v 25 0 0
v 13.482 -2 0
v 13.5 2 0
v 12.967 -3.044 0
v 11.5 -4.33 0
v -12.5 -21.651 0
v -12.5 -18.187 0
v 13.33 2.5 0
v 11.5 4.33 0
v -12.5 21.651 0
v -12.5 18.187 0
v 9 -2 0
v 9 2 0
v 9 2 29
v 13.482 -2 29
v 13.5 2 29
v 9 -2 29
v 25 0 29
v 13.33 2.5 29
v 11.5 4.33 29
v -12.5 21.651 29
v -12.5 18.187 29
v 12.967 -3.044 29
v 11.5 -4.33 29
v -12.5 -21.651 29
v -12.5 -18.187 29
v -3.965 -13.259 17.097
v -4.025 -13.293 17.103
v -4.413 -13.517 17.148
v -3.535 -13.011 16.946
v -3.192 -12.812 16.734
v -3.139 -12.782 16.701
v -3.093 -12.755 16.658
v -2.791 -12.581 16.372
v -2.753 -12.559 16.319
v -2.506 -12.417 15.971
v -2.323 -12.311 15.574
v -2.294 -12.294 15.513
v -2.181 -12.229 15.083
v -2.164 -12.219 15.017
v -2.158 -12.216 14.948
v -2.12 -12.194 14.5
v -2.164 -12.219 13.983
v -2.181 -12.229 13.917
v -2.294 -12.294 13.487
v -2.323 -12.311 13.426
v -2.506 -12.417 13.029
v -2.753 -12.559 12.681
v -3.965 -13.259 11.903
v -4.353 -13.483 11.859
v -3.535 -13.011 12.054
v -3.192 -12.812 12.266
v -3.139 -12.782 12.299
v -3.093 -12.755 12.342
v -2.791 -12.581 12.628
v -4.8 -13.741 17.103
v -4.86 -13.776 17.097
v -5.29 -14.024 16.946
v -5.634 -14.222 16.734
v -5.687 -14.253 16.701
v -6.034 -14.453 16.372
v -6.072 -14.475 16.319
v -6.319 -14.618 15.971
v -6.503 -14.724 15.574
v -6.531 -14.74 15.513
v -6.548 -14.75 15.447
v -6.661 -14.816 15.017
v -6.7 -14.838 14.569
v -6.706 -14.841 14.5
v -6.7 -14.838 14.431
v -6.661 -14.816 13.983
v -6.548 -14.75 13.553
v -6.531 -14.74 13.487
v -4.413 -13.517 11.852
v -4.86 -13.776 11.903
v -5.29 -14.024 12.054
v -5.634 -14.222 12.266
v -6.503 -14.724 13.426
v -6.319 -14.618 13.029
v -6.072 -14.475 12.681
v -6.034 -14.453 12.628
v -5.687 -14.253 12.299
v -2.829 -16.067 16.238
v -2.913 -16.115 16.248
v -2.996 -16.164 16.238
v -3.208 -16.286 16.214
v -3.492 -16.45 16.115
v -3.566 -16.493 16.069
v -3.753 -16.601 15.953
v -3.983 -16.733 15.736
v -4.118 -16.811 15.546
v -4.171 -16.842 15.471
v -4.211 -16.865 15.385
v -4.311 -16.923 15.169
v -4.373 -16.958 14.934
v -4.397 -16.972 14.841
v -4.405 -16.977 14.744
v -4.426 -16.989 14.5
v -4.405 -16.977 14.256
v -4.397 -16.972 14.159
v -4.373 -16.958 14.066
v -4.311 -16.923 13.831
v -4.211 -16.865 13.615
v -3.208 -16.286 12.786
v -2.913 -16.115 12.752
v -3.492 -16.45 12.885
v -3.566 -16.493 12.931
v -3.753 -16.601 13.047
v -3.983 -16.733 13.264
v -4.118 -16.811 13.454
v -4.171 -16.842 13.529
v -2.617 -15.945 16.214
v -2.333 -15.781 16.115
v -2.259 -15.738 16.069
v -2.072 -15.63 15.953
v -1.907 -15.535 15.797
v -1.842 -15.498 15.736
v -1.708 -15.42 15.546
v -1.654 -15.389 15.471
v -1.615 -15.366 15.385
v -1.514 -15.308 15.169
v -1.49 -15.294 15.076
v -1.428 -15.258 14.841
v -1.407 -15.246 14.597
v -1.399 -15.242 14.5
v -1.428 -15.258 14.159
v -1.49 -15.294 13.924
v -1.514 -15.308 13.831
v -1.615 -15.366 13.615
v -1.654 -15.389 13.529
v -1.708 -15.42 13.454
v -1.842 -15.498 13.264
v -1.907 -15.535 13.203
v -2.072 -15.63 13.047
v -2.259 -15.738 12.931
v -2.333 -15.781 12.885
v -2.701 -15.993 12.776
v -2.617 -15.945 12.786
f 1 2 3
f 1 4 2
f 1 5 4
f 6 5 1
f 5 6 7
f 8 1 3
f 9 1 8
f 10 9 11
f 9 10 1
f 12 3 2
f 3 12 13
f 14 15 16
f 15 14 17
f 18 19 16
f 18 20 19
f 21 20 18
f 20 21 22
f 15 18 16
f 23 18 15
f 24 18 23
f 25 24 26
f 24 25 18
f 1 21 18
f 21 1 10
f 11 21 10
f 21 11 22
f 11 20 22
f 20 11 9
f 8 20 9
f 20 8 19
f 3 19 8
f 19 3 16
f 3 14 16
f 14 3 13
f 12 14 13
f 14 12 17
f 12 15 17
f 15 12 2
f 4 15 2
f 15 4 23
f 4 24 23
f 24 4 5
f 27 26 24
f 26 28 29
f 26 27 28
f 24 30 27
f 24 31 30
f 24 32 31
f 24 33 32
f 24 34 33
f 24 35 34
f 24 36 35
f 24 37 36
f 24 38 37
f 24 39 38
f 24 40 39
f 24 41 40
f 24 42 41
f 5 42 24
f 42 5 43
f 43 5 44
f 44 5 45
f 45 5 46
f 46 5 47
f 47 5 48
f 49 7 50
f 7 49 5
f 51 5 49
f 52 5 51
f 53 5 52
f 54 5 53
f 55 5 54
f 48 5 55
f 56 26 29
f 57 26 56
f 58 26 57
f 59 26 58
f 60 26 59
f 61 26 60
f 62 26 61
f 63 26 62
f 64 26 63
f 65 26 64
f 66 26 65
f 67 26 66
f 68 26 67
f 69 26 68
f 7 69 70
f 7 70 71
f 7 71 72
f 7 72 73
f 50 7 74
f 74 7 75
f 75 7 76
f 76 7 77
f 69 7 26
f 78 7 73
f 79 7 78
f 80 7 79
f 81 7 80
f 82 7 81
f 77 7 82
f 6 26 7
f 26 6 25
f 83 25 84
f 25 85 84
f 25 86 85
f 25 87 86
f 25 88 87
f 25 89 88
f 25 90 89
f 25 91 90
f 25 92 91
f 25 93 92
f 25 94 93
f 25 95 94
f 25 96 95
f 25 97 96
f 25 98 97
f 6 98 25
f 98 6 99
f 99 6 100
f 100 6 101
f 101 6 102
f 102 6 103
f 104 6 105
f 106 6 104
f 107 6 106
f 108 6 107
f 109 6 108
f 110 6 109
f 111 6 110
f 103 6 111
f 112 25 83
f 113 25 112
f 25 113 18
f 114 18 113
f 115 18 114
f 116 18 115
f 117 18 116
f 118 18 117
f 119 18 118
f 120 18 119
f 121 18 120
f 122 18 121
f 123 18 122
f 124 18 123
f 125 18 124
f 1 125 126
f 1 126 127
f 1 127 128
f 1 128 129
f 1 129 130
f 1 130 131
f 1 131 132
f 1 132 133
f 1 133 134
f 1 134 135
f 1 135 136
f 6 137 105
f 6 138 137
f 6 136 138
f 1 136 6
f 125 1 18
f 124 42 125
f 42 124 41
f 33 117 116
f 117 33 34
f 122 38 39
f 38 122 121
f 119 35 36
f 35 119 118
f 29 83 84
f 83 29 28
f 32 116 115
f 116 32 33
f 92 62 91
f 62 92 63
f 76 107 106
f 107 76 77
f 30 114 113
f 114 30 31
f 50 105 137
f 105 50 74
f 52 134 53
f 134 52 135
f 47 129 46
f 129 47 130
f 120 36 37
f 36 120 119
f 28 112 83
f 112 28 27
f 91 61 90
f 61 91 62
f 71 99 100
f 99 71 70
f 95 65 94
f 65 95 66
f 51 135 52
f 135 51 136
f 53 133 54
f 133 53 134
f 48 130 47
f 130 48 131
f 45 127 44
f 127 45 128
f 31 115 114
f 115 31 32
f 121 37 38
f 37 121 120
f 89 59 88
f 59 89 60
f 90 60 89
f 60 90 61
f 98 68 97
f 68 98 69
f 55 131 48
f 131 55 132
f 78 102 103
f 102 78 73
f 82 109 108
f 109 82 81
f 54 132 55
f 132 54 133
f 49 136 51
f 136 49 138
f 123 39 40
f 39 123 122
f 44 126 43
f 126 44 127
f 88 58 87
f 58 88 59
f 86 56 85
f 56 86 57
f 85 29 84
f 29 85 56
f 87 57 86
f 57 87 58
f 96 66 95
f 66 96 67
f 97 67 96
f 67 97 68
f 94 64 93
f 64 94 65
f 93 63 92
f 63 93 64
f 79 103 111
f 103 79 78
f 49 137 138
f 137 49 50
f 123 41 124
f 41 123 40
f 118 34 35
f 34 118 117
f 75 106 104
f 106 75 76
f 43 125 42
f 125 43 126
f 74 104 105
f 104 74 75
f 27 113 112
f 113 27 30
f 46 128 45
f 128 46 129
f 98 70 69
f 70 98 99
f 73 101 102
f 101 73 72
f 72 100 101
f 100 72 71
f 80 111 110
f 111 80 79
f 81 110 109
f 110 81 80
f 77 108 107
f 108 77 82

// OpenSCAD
length = 29;
height = 25;
thickness = 6;
inner_h = 5;
inner_w = 4;

triangle_r = 5;

difference()
{
  linear_extrude(length) union()
  {
    difference()
    {
      circle(r = height, $fn = 3);
      translate([ -thickness - triangle_r, 0 ])
      {
        offset(triangle_r) offset(-triangle_r)
          circle(r = height + triangle_r, $fn = 3);
      }
    }
    translate([ -inner_h / 2 + height - thickness - triangle_r, 0 ])
      square([ inner_h, inner_w ], center = true);
  }

  translate([ -height *.2, -height/2, length / 2 ])
  {
    rotate([ 90, 0, 30 ])
#cylinder(d2 = 3, d1=6, h = 5, $fn = 32);

    // rotate([ -90, 0, 0 ]) cylinder(d = 6, h = height, $fn = 32);
  }
}
